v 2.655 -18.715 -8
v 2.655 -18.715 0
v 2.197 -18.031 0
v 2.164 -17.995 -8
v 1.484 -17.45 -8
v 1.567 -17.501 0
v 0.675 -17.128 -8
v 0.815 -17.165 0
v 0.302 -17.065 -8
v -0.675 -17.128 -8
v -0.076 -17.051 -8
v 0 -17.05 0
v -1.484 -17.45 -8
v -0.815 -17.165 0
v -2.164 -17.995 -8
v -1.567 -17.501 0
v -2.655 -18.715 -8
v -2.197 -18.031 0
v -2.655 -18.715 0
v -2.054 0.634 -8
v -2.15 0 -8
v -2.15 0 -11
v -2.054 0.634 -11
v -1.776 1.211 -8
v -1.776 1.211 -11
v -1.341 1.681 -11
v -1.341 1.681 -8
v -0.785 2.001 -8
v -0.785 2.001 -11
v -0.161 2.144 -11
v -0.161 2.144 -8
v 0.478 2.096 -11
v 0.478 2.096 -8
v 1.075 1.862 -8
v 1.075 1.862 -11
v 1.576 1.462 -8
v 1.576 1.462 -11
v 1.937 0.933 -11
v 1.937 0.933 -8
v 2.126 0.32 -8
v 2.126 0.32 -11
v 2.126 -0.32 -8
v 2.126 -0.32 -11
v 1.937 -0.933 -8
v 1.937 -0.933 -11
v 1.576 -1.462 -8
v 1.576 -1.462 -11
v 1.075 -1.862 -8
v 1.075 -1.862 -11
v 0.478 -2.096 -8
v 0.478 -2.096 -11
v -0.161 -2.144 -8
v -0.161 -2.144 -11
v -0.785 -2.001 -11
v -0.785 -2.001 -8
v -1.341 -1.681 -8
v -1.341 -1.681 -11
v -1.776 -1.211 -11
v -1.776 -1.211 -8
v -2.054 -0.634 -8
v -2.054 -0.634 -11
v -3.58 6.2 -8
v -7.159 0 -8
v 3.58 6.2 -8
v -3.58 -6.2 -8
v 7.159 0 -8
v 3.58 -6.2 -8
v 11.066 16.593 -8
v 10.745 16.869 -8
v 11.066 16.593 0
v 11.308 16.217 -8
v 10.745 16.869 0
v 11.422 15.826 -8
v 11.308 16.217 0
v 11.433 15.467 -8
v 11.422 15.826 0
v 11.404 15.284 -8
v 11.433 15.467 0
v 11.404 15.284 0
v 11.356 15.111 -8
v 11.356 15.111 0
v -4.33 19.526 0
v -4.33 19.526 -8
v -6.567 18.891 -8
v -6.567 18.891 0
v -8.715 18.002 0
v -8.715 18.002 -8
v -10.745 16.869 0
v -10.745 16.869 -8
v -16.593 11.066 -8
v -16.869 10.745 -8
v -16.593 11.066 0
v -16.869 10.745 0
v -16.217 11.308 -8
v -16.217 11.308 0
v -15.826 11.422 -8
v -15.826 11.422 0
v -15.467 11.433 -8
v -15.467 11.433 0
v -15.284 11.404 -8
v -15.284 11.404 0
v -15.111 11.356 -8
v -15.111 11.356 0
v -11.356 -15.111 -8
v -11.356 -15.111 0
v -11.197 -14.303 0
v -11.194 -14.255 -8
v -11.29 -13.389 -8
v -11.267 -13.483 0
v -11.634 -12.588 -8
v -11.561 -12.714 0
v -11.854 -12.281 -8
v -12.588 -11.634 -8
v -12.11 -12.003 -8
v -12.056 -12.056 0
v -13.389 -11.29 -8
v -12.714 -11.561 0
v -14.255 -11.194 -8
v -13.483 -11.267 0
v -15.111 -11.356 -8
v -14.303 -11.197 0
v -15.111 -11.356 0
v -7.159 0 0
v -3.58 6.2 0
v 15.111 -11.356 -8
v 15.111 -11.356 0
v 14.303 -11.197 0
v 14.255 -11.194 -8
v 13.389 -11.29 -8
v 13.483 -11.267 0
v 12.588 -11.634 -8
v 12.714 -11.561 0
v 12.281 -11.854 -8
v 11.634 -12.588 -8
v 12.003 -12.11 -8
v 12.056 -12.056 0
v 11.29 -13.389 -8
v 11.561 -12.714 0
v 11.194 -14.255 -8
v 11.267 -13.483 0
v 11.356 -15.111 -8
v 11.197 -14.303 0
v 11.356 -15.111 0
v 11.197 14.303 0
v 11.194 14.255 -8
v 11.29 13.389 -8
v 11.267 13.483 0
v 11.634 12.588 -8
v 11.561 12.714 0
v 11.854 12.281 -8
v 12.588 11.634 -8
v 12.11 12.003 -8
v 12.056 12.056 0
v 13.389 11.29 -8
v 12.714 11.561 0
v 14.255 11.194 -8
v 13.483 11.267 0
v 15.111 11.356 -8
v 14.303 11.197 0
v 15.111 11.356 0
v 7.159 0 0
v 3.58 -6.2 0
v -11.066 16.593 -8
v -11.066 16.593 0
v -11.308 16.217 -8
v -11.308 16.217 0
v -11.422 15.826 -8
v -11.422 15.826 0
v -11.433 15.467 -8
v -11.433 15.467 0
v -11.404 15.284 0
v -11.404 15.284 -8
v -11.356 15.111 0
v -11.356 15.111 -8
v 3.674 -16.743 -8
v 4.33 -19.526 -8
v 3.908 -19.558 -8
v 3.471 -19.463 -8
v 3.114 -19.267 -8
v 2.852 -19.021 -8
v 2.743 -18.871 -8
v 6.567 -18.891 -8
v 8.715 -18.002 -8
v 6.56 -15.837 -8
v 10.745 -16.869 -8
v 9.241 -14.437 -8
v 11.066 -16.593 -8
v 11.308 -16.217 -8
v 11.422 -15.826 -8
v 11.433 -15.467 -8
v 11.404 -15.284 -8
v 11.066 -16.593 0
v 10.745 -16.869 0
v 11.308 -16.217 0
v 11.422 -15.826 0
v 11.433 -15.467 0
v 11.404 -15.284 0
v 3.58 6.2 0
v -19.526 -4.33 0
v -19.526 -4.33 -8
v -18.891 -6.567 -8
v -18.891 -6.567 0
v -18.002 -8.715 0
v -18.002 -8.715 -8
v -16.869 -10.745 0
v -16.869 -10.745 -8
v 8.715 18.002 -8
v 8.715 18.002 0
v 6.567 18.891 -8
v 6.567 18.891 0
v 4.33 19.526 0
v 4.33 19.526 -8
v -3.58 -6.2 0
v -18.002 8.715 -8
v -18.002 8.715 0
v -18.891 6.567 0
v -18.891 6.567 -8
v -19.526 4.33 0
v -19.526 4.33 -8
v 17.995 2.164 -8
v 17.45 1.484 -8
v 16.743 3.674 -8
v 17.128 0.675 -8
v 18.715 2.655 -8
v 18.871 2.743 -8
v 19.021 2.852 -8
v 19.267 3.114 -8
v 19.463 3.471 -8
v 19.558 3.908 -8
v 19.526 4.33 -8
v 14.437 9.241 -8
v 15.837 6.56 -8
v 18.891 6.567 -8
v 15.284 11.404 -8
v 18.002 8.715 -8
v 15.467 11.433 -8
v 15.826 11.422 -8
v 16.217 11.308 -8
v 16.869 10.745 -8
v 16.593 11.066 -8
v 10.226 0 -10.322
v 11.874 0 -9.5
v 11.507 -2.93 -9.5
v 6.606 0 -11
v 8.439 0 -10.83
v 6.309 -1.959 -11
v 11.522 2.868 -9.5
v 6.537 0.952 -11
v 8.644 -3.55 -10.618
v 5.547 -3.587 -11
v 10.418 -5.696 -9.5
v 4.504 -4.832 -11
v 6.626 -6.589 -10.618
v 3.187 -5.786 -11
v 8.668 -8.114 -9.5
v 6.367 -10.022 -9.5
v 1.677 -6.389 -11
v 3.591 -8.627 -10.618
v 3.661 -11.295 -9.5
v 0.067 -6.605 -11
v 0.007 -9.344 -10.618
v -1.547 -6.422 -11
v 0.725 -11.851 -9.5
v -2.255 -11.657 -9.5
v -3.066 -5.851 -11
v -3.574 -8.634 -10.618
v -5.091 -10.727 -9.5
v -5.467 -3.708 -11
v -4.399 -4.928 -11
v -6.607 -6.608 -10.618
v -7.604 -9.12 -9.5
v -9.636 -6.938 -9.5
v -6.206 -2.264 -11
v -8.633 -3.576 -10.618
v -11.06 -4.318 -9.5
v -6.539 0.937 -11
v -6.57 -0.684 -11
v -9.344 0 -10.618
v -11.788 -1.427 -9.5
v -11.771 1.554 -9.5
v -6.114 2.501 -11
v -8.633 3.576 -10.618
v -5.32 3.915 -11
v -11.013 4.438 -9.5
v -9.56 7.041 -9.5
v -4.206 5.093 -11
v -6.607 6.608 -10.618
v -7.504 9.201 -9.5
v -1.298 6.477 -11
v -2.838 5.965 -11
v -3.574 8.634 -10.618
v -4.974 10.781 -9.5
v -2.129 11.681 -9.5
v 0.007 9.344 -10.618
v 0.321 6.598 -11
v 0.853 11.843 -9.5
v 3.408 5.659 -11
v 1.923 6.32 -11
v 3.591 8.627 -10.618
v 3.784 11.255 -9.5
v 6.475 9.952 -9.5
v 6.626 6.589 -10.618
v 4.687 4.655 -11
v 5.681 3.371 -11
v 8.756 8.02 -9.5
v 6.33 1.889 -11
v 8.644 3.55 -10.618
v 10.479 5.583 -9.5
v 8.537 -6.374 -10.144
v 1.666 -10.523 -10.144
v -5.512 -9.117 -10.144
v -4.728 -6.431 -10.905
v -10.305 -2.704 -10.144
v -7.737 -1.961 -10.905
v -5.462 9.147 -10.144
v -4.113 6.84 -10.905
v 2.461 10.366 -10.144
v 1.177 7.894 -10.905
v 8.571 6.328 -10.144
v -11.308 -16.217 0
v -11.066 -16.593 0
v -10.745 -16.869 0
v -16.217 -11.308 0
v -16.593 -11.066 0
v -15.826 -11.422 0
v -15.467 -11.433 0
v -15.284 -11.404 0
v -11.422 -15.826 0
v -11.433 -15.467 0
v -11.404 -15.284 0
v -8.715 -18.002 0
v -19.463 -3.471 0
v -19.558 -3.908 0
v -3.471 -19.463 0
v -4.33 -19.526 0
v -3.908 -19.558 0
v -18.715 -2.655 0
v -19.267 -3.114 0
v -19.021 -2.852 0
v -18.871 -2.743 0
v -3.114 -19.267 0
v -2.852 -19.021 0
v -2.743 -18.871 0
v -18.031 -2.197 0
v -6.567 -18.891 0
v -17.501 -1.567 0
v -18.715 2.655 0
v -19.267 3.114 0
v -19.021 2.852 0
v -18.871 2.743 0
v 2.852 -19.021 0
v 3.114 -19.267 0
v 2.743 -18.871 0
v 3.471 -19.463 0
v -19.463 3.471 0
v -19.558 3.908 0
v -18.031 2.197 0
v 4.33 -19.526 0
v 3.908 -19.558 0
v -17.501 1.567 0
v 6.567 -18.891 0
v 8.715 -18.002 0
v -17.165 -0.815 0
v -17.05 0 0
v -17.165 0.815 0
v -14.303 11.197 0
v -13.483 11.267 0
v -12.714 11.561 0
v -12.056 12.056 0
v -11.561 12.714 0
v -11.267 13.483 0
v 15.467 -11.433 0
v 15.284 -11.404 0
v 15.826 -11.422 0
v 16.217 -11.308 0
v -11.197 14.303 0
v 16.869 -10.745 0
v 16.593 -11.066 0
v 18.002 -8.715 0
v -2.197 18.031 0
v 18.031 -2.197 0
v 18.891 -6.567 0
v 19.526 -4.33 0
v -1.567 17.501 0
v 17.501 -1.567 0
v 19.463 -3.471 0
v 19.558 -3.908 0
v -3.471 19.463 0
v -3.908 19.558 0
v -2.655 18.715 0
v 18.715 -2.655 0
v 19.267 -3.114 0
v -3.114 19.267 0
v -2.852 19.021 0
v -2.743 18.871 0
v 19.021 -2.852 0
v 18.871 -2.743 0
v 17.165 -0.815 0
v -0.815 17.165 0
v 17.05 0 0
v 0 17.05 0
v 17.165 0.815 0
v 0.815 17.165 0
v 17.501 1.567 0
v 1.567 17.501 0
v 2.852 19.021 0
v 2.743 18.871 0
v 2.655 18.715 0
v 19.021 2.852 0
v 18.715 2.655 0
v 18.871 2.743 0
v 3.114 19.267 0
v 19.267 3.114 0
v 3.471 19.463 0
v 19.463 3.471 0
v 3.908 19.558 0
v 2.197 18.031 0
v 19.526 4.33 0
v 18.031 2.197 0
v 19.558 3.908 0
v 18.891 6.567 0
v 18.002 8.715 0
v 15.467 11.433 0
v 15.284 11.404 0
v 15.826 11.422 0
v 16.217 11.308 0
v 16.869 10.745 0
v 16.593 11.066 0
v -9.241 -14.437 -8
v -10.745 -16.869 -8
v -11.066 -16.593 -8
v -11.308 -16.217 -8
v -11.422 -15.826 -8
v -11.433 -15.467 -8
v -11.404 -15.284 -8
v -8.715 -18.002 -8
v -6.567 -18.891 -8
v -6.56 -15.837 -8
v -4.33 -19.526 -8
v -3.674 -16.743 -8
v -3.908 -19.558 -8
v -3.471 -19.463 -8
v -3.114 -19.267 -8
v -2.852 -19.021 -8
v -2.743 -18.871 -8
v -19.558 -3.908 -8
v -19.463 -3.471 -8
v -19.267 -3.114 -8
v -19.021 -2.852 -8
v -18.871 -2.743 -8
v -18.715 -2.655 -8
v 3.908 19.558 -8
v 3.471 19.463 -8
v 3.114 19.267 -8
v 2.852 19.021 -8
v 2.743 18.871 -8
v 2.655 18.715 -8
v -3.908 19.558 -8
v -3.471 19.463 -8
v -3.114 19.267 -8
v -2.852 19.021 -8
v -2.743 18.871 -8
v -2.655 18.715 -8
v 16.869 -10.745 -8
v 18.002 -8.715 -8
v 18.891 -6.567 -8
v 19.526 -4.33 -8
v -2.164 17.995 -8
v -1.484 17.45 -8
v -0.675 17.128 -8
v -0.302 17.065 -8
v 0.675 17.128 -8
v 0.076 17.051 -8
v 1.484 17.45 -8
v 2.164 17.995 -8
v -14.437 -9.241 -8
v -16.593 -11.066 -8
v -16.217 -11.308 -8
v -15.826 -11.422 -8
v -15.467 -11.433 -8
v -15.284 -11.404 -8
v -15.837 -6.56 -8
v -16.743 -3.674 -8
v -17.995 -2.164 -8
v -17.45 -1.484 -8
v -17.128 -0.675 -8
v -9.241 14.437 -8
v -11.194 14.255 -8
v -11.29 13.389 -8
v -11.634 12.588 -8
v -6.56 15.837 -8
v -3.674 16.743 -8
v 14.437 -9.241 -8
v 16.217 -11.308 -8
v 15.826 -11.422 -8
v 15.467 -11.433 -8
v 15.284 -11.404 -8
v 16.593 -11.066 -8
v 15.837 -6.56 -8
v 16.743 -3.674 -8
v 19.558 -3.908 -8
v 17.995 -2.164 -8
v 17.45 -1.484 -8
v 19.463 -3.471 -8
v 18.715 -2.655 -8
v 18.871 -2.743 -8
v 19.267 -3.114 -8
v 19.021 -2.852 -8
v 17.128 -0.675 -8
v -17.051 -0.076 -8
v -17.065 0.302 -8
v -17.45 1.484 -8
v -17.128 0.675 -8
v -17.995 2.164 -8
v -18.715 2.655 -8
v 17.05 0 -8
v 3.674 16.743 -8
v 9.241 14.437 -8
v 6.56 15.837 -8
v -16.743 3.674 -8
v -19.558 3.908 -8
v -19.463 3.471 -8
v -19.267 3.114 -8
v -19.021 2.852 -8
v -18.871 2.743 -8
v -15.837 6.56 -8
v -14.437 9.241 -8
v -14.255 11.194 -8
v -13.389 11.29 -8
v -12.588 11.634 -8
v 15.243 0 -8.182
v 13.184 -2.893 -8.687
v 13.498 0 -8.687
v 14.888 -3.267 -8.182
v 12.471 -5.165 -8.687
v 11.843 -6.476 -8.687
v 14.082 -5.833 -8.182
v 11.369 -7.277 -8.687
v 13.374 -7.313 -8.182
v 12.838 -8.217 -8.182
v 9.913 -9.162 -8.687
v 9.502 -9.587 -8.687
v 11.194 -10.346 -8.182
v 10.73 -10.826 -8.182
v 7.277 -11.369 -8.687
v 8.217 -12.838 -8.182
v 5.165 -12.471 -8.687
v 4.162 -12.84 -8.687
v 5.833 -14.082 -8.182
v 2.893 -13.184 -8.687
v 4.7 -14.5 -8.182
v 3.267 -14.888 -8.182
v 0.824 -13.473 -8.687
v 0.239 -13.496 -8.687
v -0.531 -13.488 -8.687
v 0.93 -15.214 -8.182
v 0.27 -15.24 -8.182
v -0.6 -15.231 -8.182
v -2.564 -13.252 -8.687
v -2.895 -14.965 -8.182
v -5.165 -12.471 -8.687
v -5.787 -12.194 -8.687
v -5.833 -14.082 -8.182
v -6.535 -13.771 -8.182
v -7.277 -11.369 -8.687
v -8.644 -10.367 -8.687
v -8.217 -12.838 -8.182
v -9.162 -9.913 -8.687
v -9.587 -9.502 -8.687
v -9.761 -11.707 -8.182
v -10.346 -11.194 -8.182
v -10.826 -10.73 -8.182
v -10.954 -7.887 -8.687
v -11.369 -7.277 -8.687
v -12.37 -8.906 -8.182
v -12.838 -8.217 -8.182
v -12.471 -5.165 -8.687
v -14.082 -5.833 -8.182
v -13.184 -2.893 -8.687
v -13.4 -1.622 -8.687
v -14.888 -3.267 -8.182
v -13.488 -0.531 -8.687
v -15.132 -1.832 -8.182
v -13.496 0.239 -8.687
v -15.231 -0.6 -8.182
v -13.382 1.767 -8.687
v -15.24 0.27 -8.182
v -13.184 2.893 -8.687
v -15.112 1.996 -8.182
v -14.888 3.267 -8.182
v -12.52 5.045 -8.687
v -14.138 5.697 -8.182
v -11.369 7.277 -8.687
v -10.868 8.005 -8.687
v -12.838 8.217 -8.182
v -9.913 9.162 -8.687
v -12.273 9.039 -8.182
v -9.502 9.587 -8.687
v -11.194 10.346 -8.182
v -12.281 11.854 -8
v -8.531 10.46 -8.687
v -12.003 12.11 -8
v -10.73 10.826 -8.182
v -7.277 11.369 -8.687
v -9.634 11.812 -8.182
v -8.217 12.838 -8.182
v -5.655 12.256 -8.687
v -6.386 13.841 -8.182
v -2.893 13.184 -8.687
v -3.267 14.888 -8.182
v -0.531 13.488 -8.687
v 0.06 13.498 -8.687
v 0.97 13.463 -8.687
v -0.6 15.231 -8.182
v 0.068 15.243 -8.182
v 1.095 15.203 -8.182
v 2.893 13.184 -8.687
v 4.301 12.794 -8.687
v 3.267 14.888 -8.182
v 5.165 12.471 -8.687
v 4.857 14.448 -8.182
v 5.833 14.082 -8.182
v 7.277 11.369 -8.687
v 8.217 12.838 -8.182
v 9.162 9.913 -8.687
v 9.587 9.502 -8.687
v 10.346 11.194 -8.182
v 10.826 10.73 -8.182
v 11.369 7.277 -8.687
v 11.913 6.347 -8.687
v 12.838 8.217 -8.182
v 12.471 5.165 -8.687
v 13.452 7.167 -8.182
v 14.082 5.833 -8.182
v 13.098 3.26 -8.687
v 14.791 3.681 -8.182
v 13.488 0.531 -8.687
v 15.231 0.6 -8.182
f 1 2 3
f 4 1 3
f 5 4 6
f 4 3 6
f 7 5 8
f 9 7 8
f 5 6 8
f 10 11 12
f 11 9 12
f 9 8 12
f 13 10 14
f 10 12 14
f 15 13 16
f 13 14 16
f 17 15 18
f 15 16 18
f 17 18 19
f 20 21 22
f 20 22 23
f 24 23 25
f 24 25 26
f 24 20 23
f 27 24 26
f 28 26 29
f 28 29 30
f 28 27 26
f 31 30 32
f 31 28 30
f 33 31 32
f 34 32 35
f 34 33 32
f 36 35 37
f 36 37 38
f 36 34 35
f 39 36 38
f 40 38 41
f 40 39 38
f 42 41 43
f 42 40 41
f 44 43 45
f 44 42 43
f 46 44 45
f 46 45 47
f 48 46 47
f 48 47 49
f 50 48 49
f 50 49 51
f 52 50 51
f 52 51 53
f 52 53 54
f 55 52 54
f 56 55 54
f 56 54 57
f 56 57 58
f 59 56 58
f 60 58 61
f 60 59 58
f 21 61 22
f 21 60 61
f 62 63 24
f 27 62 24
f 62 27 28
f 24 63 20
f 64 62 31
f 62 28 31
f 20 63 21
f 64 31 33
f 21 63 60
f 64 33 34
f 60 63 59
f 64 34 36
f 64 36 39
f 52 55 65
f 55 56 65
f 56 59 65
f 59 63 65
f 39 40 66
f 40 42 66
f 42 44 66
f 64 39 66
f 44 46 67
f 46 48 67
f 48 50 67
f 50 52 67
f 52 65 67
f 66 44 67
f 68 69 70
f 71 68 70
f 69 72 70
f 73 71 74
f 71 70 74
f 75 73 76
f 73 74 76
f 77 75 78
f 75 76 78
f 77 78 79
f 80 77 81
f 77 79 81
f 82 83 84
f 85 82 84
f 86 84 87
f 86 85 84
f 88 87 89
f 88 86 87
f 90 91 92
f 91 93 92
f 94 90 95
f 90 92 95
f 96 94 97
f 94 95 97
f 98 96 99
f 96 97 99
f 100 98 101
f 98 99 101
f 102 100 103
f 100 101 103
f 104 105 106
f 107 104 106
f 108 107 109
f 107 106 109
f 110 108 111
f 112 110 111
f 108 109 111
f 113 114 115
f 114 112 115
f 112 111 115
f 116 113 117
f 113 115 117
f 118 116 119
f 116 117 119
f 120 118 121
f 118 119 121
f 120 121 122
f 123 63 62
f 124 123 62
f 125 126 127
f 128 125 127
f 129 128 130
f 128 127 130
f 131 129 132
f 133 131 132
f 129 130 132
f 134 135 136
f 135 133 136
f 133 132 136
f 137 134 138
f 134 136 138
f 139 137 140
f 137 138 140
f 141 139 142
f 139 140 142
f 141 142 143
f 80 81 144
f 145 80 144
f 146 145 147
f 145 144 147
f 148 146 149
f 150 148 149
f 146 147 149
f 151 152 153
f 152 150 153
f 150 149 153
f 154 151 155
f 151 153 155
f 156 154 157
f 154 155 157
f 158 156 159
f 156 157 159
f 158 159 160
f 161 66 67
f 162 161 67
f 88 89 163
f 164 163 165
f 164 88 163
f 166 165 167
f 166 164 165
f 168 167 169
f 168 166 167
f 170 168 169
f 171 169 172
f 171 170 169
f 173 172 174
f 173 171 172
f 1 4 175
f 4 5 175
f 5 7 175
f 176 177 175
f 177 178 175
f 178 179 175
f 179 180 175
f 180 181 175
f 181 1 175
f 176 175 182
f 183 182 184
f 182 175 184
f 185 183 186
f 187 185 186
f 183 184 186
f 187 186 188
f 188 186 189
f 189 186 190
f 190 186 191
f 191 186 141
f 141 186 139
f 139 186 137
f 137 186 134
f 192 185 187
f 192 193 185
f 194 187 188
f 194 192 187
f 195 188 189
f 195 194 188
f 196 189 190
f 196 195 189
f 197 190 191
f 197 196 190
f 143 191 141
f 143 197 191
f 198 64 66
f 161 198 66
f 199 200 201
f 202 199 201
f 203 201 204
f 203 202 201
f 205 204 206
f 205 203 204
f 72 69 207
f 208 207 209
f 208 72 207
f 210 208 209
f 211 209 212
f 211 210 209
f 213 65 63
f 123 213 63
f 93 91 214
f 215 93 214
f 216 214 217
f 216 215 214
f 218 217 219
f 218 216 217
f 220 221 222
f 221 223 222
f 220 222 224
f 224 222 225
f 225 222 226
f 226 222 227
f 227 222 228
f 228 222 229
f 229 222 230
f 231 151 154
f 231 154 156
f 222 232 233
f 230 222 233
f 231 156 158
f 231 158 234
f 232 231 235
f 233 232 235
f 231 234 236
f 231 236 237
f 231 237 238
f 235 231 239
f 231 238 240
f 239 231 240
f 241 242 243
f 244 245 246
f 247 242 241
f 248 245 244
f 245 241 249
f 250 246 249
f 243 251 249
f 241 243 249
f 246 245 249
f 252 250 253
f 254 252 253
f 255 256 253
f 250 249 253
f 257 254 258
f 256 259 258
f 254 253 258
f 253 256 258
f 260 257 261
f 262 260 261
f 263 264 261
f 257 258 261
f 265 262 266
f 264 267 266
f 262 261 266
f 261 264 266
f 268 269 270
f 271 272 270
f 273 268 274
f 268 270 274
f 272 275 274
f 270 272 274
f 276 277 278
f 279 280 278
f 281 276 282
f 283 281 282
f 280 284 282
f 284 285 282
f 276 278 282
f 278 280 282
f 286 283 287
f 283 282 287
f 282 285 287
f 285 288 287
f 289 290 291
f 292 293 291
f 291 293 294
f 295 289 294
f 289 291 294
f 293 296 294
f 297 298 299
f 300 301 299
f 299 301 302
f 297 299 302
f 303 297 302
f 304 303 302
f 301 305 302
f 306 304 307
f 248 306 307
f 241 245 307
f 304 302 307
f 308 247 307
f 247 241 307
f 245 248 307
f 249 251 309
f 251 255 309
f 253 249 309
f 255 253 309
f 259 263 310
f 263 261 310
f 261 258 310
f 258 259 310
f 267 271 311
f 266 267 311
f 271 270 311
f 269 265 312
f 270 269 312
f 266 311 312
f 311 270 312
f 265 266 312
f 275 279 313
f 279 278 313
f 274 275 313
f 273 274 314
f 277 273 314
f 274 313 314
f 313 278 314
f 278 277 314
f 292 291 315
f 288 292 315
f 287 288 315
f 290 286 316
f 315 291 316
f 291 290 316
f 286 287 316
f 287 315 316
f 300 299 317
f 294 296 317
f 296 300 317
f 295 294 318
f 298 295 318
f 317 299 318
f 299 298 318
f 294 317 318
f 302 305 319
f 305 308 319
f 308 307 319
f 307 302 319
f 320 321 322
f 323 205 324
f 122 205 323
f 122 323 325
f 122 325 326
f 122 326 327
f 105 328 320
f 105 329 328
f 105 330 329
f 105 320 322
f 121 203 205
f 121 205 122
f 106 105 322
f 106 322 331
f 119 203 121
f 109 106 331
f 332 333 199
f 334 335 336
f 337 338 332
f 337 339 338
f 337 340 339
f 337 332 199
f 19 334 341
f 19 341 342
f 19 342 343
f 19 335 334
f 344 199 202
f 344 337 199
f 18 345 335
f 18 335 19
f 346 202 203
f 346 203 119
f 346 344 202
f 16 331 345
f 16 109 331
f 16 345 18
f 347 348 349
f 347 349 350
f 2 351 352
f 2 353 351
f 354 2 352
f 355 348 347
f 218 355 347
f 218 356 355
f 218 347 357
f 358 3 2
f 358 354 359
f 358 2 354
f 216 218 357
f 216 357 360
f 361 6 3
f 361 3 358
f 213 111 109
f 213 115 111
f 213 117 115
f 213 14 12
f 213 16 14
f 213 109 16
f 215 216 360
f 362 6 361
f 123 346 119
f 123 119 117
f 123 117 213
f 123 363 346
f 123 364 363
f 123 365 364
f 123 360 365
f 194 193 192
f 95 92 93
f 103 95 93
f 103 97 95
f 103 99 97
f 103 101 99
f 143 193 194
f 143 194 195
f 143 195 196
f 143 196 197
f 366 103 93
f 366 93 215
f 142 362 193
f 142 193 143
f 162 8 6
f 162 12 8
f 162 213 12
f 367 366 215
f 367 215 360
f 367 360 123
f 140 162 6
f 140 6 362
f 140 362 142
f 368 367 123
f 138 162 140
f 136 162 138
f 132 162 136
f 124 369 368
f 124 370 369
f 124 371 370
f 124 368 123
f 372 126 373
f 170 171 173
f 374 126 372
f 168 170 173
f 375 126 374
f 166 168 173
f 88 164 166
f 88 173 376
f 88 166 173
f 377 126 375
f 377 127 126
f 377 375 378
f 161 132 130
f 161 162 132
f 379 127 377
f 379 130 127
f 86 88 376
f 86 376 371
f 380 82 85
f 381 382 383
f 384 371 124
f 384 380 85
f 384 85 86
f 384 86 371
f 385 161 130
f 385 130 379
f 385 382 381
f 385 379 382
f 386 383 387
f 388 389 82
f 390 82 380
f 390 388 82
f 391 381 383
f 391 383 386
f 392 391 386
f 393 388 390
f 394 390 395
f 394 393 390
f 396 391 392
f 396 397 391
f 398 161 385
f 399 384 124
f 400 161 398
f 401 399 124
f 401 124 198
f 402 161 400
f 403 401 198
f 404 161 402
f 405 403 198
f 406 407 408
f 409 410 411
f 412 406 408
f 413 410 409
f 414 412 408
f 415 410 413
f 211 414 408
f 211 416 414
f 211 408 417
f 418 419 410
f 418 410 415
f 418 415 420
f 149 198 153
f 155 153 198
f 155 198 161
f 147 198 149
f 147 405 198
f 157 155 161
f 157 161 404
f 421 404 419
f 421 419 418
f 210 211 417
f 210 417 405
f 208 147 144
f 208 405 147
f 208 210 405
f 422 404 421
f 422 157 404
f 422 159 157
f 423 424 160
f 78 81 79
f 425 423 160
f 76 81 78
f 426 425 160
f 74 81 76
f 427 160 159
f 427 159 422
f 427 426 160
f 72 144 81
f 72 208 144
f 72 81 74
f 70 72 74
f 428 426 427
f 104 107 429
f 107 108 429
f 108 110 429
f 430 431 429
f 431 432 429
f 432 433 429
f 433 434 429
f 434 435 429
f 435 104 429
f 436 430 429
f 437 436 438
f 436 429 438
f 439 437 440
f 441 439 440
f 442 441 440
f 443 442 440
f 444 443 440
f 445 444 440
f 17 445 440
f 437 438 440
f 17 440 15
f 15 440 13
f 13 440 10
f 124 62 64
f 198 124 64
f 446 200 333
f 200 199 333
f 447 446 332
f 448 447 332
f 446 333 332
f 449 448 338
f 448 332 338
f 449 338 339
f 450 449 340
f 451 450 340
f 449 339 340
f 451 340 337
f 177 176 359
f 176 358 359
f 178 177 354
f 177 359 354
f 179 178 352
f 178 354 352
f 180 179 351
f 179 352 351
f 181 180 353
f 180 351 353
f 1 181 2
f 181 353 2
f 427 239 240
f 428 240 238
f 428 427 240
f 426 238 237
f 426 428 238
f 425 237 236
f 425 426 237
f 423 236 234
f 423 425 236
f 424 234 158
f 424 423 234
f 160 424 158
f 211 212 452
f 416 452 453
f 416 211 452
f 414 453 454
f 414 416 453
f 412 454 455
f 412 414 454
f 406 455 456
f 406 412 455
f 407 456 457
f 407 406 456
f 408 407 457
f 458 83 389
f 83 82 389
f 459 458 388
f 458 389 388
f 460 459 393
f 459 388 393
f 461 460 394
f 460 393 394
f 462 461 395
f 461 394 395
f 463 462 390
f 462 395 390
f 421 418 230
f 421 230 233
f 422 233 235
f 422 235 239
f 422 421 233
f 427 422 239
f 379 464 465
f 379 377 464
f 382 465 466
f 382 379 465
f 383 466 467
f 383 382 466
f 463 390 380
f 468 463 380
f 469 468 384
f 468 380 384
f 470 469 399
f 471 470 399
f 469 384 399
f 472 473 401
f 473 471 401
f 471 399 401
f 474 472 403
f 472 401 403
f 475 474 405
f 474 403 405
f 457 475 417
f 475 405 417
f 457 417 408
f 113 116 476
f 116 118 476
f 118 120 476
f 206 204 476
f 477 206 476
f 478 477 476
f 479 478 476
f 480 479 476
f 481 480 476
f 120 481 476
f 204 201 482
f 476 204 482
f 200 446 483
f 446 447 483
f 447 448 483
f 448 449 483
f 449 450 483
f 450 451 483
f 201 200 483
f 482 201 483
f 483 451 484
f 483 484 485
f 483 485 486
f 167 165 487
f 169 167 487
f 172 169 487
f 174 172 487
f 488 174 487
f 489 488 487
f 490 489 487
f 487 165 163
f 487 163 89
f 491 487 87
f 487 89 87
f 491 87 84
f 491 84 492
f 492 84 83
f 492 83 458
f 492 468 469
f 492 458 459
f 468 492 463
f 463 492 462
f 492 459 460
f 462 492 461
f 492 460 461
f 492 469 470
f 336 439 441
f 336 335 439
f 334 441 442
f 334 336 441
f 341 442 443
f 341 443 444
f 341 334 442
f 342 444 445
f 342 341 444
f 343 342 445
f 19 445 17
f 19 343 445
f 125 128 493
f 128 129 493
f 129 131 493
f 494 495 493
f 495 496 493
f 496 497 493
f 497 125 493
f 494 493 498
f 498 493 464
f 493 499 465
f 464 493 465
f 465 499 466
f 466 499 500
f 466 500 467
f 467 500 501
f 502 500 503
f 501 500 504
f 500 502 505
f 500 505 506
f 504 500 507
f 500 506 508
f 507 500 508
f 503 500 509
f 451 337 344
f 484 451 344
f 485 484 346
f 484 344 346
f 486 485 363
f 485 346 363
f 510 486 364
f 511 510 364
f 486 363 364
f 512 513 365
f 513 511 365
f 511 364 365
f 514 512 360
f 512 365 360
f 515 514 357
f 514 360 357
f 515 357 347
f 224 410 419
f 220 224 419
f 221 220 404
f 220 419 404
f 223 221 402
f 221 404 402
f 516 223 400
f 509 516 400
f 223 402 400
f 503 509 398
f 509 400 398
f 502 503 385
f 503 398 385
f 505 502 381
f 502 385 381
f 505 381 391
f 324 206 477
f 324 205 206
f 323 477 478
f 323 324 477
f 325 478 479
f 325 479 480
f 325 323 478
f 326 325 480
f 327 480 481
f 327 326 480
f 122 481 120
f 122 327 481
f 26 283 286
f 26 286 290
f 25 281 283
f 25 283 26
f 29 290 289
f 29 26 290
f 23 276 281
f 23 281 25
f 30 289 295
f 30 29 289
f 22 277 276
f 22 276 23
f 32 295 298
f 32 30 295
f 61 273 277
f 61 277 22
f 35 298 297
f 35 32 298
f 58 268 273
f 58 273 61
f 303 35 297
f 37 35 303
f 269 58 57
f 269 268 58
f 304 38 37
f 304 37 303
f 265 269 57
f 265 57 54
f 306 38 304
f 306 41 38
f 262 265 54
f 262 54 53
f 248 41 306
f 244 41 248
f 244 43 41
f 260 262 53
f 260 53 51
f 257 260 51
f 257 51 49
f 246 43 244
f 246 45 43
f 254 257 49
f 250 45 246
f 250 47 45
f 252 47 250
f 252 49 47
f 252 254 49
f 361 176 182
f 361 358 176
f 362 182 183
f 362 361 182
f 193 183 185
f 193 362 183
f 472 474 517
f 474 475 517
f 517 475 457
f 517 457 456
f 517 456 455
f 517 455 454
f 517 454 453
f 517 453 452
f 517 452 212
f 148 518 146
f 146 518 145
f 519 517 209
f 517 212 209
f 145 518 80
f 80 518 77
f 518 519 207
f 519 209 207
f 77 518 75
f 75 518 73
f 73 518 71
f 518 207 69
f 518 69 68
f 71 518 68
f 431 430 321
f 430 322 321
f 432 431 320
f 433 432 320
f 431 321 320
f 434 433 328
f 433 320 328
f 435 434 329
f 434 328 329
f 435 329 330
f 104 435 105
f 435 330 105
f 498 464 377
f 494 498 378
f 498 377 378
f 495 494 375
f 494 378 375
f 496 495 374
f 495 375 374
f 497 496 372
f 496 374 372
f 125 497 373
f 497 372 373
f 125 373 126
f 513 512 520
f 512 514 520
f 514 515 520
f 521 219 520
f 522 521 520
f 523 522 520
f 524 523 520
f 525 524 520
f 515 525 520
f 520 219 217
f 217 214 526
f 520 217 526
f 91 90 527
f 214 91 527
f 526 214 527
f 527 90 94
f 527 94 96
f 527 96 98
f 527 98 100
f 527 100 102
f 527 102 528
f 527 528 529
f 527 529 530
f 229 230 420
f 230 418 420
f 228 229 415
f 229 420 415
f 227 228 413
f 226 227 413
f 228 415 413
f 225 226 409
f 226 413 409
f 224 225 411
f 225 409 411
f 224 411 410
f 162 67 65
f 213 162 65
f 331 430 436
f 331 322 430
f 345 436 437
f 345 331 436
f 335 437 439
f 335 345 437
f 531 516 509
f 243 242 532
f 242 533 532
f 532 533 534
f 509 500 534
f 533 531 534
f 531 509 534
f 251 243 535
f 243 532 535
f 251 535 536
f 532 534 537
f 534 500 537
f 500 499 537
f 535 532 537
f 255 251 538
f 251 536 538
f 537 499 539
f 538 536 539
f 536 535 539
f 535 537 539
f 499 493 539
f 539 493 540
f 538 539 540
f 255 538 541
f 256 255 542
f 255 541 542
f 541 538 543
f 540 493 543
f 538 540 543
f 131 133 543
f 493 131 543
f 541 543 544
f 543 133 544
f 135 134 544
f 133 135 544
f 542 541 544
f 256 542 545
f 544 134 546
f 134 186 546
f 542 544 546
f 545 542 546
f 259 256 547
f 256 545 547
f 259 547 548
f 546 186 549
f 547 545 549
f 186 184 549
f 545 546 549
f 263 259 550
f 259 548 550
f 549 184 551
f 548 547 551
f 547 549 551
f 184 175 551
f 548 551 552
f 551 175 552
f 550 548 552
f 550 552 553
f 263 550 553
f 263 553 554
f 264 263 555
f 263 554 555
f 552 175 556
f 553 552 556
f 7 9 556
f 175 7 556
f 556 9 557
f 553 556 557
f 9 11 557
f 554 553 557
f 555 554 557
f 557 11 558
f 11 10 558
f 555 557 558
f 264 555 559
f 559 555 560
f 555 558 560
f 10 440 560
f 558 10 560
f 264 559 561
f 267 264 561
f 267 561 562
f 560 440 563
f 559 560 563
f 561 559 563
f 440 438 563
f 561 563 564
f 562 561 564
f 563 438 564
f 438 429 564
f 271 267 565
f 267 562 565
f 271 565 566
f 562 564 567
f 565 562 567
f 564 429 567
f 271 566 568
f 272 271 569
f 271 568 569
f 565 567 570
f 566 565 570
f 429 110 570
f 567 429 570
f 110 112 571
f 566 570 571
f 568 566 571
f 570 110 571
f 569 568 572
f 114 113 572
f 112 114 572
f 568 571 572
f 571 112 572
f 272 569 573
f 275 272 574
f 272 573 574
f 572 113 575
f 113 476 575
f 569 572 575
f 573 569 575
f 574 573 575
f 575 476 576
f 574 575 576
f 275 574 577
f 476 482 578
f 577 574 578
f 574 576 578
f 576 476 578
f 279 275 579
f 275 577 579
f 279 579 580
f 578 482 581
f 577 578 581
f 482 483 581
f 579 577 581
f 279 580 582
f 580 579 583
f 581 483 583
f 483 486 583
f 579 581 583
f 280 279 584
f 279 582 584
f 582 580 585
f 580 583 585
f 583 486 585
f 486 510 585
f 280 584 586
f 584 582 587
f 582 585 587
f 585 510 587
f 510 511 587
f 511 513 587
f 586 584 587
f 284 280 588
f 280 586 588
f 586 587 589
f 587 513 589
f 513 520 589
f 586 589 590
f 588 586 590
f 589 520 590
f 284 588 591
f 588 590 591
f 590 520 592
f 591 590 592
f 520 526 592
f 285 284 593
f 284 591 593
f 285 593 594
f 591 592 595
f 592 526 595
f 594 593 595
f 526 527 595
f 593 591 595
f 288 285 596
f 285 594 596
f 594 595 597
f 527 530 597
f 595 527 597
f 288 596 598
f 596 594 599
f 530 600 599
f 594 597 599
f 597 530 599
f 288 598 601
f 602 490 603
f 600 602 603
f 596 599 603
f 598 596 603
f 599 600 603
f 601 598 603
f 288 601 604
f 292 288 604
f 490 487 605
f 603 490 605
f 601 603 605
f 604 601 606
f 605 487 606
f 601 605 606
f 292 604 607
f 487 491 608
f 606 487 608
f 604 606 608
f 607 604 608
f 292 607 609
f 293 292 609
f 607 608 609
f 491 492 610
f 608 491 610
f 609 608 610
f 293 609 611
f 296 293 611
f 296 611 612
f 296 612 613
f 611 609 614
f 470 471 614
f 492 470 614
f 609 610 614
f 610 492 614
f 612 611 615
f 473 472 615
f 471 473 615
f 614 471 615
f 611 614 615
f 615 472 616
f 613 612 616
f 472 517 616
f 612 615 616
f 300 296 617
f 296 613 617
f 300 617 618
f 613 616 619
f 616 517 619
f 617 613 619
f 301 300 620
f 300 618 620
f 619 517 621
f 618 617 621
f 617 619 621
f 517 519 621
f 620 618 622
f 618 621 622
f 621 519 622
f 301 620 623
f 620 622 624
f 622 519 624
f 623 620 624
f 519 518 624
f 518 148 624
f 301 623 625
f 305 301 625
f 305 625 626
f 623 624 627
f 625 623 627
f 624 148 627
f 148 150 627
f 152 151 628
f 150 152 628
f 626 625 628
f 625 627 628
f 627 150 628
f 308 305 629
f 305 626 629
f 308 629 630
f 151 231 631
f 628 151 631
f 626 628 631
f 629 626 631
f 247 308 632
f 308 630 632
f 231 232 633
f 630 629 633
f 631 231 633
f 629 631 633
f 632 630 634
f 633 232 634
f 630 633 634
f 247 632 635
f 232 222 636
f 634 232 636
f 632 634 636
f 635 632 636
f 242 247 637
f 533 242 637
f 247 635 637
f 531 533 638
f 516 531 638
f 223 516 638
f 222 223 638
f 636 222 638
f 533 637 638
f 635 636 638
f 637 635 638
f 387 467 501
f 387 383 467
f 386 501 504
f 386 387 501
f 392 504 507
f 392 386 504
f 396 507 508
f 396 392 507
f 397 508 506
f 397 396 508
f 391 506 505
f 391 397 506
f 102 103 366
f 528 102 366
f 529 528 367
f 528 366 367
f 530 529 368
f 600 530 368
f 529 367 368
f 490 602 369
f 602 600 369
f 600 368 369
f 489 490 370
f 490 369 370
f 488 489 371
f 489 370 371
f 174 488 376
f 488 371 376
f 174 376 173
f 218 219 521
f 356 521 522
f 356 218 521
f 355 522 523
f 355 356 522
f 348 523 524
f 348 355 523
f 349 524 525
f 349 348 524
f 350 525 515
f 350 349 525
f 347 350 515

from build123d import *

# Parameters (mm, degrees)
CROQUIS1_R              = 20
SALIENTE_EXTRUIR1_DEPTH = 8
CORTAR_EXTRUIR1_DEPTH   = 8
CORTAR_EXTRUIR2_DEPTH   = 10
CROQUIS4_R              = 10
CROQUIS4_R_2            = 2.15
SALIENTE_EXTRUIR2_DEPTH = 3
REDONDEO1_R             = 10
REDONDEO2_R             = 10
CROQUIS5_R              = 2.95
CORTAR_EXTRUIR4_DEPTH   = 31.099222036
REDONDEO4_R             = 1.5


with BuildPart() as part:
    # Croquis1 → Saliente-Extruir1 (new body)
    with BuildSketch(Plane.XY):
        Circle(CROQUIS1_R)
        with BuildLine():
            Line((-1.204159458, 1.2), (1.204159458, 1.2))
            ThreePointArc((1.204159458, 1.2), (0, -1.7), (-1.204159458, 1.2))
        make_face(mode=Mode.SUBTRACT)
    extrude(amount=-SALIENTE_EXTRUIR1_DEPTH)

    # Croquis2 → Cortar-Extruir1 (cut)
    with BuildSketch(Plane.XY):
        with BuildLine():
            ThreePointArc((2.743493279, 19.8109375), (0, 20), (-2.743493279, 19.8109375))
            ThreePointArc((-2.743493279, 19.8109375), (0, 17.25), (2.743493279, 19.8109375))
        make_face()
        with BuildLine():
            ThreePointArc((-15.948597043, 12.068233192), (-12.197270604, 12.196913347), (-12.068700327, 15.948243553))
            ThreePointArc((-12.068700327, 15.948243553), (-14.142342736, 14.141928508), (-15.948597043, 12.068233192))
        make_face()
        with BuildLine():
            ThreePointArc((15.948184756, 12.068778024), (14.141928523, 14.142342722), (12.068310924, 15.948538223))
            ThreePointArc((12.068310924, 15.948538223), (12.197913345, 12.198270606), (15.948184756, 12.068778024))
        make_face()
        with BuildLine():
            ThreePointArc((-19.810790862, -2.744551953), (-17.249000003, -0.000862493), (-19.811065232, 2.742570761))
            ThreePointArc((-19.811065232, 2.742570761), (-19.999999975, -0.00100005), (-19.810790862, -2.744551953))
        make_face()
        with BuildLine():
            ThreePointArc((19.811084118, -2.742434336), (19.999999975, 0.00099995), (19.810809789, 2.744415332))
            ThreePointArc((19.810809789, 2.744415332), (17.251000003, 0.000862507), (19.811084118, -2.742434336))
        make_face()
        with BuildLine():
            ThreePointArc((-12.06710539, -15.949450383), (-12.196050859, -12.198133106), (-15.947390094, -12.069828051))
            ThreePointArc((-15.947390094, -12.069828051), (-14.140928423, -14.143342722), (-12.06710539, -15.949450383))
        make_face()
        with BuildLine():
            ThreePointArc((12.069905665, -15.947331352), (14.143342636, -14.140928508), (15.949391508, -12.067183206))
            ThreePointArc((15.949391508, -12.067183206), (12.199133118, -12.197050847), (12.069905665, -15.947331352))
        make_face()
        with BuildLine():
            ThreePointArc((2.745474352, -19.810663053), (0.001725, -17.250000014), (-2.741512165, -19.811211751))
            ThreePointArc((-2.741512165, -19.811211751), (0.002, -19.9999999), (2.745474352, -19.810663053))
        make_face()
    extrude(amount=-CORTAR_EXTRUIR1_DEPTH, mode=Mode.SUBTRACT)

    # Croquis3 → Cortar-Extruir2 (cut)
    with BuildSketch(Plane(origin=(0, 0, -8), x_dir=(-1, 0, 0), z_dir=(0, 0, -1))):
        Polygon((7.159143338, 0), (3.579571669, 6.2), (-3.579571669, 6.2), (-7.159143338, 0), (-3.579571669, -6.2), (3.579571669, -6.2), align=None)
    extrude(amount=-CORTAR_EXTRUIR2_DEPTH, mode=Mode.SUBTRACT)

    # Croquis4 → Saliente-Extruir2 (add)
    with BuildSketch(Plane(origin=(0, 0, -8), x_dir=(-1, 0, 0), z_dir=(0, 0, -1))):
        with Locations(Location((0, 0, 0), (0, 0, 180))):
            Circle(CROQUIS4_R)
        Circle(CROQUIS4_R_2, mode=Mode.SUBTRACT)
    extrude(amount=SALIENTE_EXTRUIR2_DEPTH)

    # Redondeo1
    # the kernel refuses this fillet: 10 mm, written as the material it adds along each edge
    with BuildSketch(Plane(origin=(0, 0, -8), x_dir=(1, 0, 0), z_dir=(0, 1, 0))) as redondeo1_piece_1:
        with BuildLine():
            CenterArc((17.141428429, 10), REDONDEO1_R, 224.427004001, 45.572995999)
            Line((10, 3), (9.857171431, 2.86))
            ThreePointArc((9.857171431, 2.86), (9.8, 1.5), (9.8, 0))
            Line((9.8, 0), (10, -0.2))
            Line((10, -0.2), (17.141428429, -0.2))
            Line((17.141428429, -0.2), (17.141428429, 0))
        make_face()
    revolve(axis=Axis((0, 0, -8), (0, 0, -1)))

    # Redondeo2
    redondeo2_edges = [part.edges().sort_by_distance(p)[0] for p in [
        (-10, 0, -11),
    ]]
    fillet(redondeo2_edges, radius=REDONDEO2_R)

    # Croquis5 → Cortar-Extruir4 (cut, through all)
    with BuildSketch(Plane.XY):
        with Locations((0, 20)):
            Circle(CROQUIS5_R)
        with Locations((14.142135624, 14.142135624)):
            Circle(CROQUIS5_R)
        with Locations((20, 0)):
            Circle(CROQUIS5_R)
        with Locations((14.142135624, -14.142135624)):
            Circle(CROQUIS5_R)
        with Locations((0, -20)):
            Circle(CROQUIS5_R)
        with Locations((-14.142135624, -14.142135624)):
            Circle(CROQUIS5_R)
        with Locations((-20, 0)):
            Circle(CROQUIS5_R)
        with Locations((-14.142135624, 14.142135624)):
            Circle(CROQUIS5_R)
    extrude(amount=-CORTAR_EXTRUIR4_DEPTH, mode=Mode.SUBTRACT)

    # Redondeo4
    redondeo4_edges = [part.edges().sort_by_distance(p)[0] for p in [
        (-11.908011282, 16.068580127, -4),
        (-16.068580127, 11.908011282, -4),
        (-19.7824375, -2.941966444, -4),
        (-19.7824375, 2.941966444, -4),
        (-16.068580127, -11.908011282, -4),
        (-11.908011282, -16.068580127, -4),
        (2.941966444, -19.7824375, -4),
        (-2.941966444, -19.7824375, -4),
        (11.908011282, -16.068580127, -4),
        (16.068580127, -11.908011282, -4),
        (19.7824375, 2.941966444, -4),
        (19.7824375, -2.941966444, -4),
        (11.908011282, 16.068580127, -4),
        (16.068580127, 11.908011282, -4),
        (-2.941966444, 19.7824375, -4),
        (2.941966444, 19.7824375, -4),
    ]]
    fillet(redondeo4_edges, radius=REDONDEO4_R)


solid = part.part
